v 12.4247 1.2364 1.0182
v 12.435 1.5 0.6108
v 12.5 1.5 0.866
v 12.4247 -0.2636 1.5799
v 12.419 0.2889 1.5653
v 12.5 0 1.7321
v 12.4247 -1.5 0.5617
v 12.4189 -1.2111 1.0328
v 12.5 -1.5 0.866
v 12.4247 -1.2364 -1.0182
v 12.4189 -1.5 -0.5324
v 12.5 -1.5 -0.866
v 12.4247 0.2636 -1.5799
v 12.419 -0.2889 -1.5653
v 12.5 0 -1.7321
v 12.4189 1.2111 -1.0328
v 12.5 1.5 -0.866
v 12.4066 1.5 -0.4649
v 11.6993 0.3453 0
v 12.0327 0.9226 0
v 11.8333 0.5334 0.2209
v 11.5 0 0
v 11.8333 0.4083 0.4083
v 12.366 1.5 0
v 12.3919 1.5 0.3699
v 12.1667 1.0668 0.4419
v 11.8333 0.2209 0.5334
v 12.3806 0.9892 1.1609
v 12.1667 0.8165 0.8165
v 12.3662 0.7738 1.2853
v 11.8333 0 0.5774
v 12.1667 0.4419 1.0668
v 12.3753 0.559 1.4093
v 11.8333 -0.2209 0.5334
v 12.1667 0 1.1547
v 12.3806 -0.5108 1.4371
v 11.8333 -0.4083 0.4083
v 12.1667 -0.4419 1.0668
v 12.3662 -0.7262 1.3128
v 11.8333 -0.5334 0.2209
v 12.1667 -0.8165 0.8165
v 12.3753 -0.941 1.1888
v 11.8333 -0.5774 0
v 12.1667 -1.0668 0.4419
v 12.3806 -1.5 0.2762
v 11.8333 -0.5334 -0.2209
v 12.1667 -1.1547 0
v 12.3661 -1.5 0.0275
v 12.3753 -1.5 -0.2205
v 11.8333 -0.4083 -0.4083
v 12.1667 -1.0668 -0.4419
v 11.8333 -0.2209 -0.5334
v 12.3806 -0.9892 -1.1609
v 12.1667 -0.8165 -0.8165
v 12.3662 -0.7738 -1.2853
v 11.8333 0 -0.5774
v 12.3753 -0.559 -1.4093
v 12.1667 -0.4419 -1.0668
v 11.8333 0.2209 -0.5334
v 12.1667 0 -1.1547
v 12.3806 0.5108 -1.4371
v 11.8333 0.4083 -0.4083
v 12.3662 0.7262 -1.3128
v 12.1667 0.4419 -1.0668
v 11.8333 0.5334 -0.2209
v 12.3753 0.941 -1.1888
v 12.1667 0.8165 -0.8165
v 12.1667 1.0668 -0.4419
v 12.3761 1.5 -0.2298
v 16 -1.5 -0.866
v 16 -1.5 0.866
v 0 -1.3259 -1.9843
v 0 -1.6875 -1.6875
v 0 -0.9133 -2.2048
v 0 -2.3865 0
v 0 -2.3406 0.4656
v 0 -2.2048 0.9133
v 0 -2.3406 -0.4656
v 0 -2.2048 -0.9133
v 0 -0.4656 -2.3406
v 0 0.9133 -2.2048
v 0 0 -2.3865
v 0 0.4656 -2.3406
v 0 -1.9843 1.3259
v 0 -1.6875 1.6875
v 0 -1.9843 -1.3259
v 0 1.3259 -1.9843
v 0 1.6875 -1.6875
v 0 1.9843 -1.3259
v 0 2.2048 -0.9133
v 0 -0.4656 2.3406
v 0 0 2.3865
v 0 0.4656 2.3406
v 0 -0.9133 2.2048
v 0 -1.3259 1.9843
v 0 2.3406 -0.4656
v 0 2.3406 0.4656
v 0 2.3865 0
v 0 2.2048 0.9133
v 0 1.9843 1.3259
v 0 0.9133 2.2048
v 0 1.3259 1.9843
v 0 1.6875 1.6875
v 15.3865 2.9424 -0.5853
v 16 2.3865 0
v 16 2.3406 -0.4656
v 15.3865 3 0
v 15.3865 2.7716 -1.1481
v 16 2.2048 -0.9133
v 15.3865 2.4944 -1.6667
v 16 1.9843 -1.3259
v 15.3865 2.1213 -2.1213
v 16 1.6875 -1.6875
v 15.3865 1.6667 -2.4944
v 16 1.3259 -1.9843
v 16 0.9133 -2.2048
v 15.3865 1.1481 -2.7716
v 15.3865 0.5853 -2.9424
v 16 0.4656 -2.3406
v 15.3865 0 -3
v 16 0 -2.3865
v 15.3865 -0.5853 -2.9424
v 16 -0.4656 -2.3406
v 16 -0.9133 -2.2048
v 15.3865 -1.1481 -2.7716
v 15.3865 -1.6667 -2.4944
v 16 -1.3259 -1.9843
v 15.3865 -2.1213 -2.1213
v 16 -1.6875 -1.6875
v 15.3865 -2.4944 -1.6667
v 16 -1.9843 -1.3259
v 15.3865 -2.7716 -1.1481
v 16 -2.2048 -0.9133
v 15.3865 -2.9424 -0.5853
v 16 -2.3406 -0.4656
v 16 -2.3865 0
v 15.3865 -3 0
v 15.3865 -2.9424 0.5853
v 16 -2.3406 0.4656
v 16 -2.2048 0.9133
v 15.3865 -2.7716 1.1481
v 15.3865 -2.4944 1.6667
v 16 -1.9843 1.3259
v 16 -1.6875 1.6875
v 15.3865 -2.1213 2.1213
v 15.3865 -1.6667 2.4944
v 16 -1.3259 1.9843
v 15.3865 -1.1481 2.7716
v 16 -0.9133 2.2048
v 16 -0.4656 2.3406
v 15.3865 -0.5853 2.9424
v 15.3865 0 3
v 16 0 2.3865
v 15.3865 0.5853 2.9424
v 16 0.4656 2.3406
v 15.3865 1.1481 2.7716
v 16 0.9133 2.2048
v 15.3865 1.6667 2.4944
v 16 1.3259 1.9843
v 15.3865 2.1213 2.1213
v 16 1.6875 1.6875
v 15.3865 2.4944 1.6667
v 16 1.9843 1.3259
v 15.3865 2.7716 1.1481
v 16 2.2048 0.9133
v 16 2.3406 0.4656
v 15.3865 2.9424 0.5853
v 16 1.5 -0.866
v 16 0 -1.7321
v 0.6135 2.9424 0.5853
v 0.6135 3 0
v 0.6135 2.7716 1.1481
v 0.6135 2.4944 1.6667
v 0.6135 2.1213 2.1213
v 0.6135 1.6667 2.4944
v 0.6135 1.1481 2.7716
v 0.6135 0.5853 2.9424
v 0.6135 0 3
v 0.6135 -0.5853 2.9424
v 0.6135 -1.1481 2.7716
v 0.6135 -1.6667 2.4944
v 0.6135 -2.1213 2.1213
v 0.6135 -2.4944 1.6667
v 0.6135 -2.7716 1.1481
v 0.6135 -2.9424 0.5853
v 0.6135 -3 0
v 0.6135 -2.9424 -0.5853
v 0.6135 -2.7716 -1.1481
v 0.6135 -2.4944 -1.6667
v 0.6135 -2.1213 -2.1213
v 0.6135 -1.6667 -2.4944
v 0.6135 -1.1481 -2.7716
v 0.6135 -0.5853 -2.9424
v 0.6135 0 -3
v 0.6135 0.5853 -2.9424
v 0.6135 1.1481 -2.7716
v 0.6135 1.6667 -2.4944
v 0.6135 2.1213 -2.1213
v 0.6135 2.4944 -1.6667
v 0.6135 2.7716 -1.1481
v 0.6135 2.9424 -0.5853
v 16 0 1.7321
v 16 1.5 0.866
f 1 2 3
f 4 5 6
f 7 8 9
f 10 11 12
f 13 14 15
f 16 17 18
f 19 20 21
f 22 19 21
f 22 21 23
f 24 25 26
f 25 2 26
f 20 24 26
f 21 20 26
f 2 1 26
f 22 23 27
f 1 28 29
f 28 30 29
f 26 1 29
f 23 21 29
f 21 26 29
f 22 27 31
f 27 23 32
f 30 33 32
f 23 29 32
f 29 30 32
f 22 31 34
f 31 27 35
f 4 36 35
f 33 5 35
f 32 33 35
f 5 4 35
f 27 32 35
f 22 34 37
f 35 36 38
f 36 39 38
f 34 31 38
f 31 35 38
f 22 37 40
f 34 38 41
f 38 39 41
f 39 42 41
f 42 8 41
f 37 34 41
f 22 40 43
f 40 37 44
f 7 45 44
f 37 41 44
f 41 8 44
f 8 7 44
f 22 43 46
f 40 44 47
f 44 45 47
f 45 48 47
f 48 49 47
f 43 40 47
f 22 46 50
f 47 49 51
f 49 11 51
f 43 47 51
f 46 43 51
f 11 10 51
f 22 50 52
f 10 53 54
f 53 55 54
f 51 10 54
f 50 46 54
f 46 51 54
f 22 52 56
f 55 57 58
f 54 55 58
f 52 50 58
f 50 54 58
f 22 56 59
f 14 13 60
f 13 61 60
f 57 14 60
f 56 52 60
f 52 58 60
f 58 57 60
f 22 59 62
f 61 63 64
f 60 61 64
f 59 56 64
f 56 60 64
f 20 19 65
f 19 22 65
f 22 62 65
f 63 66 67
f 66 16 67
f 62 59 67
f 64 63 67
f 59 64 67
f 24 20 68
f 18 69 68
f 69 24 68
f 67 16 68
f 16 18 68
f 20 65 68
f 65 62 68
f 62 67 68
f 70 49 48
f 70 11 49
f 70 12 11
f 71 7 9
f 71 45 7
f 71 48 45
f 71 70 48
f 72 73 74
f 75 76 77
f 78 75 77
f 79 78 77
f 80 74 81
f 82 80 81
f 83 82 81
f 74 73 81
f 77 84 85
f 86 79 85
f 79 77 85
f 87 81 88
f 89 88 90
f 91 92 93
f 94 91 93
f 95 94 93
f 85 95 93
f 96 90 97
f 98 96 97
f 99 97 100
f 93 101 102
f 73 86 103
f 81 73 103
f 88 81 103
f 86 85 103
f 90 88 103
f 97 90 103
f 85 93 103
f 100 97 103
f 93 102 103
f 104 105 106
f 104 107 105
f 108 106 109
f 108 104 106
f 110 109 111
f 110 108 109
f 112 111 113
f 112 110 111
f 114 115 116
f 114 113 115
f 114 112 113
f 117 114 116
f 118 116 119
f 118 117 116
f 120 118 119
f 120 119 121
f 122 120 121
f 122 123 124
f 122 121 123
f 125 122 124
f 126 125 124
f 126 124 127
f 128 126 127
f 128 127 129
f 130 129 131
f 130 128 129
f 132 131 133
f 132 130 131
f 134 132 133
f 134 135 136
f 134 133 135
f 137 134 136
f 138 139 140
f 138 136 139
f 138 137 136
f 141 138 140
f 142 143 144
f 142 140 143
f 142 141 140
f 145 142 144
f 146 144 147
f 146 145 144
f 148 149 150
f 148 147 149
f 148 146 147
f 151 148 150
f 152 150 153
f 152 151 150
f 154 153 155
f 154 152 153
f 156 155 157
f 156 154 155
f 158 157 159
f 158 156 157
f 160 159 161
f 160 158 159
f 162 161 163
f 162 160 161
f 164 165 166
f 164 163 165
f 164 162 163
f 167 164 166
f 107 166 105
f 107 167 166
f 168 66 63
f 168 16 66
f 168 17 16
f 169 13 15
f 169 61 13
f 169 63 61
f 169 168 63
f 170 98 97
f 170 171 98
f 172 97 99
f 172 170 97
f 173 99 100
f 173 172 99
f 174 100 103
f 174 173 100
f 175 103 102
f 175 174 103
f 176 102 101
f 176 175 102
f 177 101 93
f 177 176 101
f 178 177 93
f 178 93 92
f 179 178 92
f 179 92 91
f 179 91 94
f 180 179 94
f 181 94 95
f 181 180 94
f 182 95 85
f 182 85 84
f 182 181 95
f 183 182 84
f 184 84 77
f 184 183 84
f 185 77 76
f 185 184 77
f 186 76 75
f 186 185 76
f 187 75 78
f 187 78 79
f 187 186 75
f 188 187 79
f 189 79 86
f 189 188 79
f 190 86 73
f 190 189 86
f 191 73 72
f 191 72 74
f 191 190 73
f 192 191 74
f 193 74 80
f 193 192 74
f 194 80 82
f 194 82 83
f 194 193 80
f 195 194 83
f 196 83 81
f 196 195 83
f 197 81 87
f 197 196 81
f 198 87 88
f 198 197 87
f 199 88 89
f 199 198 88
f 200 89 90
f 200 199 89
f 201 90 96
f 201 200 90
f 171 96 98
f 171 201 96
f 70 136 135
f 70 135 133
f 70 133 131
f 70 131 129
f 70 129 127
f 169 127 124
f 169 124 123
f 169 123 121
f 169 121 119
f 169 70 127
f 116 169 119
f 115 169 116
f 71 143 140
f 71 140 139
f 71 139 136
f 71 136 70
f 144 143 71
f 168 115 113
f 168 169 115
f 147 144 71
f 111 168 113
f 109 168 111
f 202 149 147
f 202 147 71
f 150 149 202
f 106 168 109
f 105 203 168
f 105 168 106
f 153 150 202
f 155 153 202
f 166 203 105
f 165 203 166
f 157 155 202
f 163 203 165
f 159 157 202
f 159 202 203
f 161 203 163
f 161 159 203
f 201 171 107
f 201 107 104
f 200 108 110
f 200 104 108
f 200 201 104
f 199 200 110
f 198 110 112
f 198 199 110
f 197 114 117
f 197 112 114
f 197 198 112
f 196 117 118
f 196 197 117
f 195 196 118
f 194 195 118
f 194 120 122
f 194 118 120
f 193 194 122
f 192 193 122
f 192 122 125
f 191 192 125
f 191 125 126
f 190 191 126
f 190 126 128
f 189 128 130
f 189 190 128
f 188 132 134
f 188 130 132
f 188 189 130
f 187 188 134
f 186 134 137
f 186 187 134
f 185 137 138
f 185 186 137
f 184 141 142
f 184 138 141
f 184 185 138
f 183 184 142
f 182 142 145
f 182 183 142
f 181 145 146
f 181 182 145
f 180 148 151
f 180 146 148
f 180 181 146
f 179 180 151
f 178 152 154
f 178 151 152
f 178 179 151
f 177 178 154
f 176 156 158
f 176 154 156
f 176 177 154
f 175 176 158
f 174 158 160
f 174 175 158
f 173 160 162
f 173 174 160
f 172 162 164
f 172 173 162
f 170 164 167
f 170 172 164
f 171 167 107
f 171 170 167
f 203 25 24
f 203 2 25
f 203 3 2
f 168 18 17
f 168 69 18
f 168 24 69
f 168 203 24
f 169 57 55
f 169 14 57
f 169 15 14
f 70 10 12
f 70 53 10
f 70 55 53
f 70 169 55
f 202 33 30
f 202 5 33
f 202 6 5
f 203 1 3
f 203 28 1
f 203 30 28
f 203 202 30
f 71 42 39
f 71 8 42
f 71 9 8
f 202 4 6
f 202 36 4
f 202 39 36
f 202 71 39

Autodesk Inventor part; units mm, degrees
ref_plane "YZ Plane" through (0, 0, 0) normal (1, 0, 0) x (0, 1, 0)
ref_plane "XZ Plane" through (0, 0, 0) normal (0, 1, 0) x (-1, 0, 0)
sketch "Sketch1" plane through (0, 0, 0) normal (0, 0, 1) x (1, 0, 0)
  line L0 (0, 0) -> (11.5, 0)
  line L1 (16, 1.7321) -> (16, 3)
  line L2 (16, 3) -> (0, 3)
  line L3 (16, 1.7321) -> (12.5, 1.7321)
  line L4 (12.5, 1.7321) -> (11.5, 0)
  line L5 (0, -0.6) -> (0, 3.6) projected
  line L6 (0, 3) -> (0, 0)
  dimension "d0" = 3.5
  dimension "d1" = 60
  dimension "d2" = 6
  dimension "d3" = 3.4641
  dimension "d5" = 16
revolve "Body" add sketch "Sketch1" angle 360 about axis through (0, 0, 0) along (1, 0, 0)
chamfer "Chamfer1" distance 0.6135 angle 45 1 edges at (16, -3, 0) measured on face at (16, 2.5483, -0.2393)
sketch "Sketch2" plane through (16, 0, 0) normal (1, 0, 0) x (0, 0, -1)
  circle A0 centre (0, 0) radius 1.7321 projected
  line L0 (-0.866, 1.5) -> (0.866, 1.5)
  line L1 (0.866, 1.5) -> (1.7321, 0)
  line L2 (1.7321, 0) -> (0.866, -1.5)
  line L3 (0.866, -1.5) -> (-0.866, -1.5)
  line L4 (-0.866, -1.5) -> (-1.7321, 0)
  line L5 (-1.7321, 0) -> (-0.866, 1.5)
  point P0 (0, 0)
  point P1 (0, 0)
extrude "Slot" add sketch "Sketch2" against normal up to next contours L1 A0 | A0 L2 | L0 A0 | A0 L3 | L5 A0 | A0 L4
thread "Thread" size "M6x1" class "6g" standard "ISO Metric profile" length 16
chamfer "Chamfer2" distance 0.6135 angle 45 1 edges at (0, -3, 0) measured on face at (5.1288, 2.9612, -0.4812)
ref_plane "Work Plane1" through (8, 0, 0) normal (0, 0.5, 0.866) x (1, 0, 0)
equation "\"d7\" = -0.5 * GD1 + 0.5 * NND"
equation "\"d8\" = FAWI"
equation "\"d29\" = -0.5 * GD1 + 0.5 * NND"
equation "\"d11\" = NLG"
equation "\"d13\" = -0.5 * GD1 + 0.5 * NND"
equation "\"d14\" = FAWI"
equation "\"d30\" = -0.5 * GD1 + 0.5 * NND"
equation "\"d0\" = INTI"
equation "\"d2\" = NND"
equation "\"d3\" = 1.1547 * SW"
equation "\"d5\" = NLG"
equation "\"NND\" = 6"
equation "\"NLG\" = 16"
equation "\"INTI\" = 3.5"
equation "\"FAWI\" = 45deg"
equation "\"SW\" = 3"
equation "\"GD1\" = THREADDIA - 1.2269 * PTC"
equation "\"FAWI1\" = 45deg"
equation "\"GUL\" = 0.61345 * PTC"
equation "\"SPD\" = 4"
equation "\"SEWI\" = 90deg"
equation "\"TOA\" = 30deg"
equation "\"THREADDIA\" = 6"
equation "\"PTC\" = 1"
equation "\"GAL\" = 0.61345 * PTC"
equation "\"E0\" = 1.155 * SW"
properties part number "ISO 4026 - M6 x 16" material "Stainless Steel, 440C"
